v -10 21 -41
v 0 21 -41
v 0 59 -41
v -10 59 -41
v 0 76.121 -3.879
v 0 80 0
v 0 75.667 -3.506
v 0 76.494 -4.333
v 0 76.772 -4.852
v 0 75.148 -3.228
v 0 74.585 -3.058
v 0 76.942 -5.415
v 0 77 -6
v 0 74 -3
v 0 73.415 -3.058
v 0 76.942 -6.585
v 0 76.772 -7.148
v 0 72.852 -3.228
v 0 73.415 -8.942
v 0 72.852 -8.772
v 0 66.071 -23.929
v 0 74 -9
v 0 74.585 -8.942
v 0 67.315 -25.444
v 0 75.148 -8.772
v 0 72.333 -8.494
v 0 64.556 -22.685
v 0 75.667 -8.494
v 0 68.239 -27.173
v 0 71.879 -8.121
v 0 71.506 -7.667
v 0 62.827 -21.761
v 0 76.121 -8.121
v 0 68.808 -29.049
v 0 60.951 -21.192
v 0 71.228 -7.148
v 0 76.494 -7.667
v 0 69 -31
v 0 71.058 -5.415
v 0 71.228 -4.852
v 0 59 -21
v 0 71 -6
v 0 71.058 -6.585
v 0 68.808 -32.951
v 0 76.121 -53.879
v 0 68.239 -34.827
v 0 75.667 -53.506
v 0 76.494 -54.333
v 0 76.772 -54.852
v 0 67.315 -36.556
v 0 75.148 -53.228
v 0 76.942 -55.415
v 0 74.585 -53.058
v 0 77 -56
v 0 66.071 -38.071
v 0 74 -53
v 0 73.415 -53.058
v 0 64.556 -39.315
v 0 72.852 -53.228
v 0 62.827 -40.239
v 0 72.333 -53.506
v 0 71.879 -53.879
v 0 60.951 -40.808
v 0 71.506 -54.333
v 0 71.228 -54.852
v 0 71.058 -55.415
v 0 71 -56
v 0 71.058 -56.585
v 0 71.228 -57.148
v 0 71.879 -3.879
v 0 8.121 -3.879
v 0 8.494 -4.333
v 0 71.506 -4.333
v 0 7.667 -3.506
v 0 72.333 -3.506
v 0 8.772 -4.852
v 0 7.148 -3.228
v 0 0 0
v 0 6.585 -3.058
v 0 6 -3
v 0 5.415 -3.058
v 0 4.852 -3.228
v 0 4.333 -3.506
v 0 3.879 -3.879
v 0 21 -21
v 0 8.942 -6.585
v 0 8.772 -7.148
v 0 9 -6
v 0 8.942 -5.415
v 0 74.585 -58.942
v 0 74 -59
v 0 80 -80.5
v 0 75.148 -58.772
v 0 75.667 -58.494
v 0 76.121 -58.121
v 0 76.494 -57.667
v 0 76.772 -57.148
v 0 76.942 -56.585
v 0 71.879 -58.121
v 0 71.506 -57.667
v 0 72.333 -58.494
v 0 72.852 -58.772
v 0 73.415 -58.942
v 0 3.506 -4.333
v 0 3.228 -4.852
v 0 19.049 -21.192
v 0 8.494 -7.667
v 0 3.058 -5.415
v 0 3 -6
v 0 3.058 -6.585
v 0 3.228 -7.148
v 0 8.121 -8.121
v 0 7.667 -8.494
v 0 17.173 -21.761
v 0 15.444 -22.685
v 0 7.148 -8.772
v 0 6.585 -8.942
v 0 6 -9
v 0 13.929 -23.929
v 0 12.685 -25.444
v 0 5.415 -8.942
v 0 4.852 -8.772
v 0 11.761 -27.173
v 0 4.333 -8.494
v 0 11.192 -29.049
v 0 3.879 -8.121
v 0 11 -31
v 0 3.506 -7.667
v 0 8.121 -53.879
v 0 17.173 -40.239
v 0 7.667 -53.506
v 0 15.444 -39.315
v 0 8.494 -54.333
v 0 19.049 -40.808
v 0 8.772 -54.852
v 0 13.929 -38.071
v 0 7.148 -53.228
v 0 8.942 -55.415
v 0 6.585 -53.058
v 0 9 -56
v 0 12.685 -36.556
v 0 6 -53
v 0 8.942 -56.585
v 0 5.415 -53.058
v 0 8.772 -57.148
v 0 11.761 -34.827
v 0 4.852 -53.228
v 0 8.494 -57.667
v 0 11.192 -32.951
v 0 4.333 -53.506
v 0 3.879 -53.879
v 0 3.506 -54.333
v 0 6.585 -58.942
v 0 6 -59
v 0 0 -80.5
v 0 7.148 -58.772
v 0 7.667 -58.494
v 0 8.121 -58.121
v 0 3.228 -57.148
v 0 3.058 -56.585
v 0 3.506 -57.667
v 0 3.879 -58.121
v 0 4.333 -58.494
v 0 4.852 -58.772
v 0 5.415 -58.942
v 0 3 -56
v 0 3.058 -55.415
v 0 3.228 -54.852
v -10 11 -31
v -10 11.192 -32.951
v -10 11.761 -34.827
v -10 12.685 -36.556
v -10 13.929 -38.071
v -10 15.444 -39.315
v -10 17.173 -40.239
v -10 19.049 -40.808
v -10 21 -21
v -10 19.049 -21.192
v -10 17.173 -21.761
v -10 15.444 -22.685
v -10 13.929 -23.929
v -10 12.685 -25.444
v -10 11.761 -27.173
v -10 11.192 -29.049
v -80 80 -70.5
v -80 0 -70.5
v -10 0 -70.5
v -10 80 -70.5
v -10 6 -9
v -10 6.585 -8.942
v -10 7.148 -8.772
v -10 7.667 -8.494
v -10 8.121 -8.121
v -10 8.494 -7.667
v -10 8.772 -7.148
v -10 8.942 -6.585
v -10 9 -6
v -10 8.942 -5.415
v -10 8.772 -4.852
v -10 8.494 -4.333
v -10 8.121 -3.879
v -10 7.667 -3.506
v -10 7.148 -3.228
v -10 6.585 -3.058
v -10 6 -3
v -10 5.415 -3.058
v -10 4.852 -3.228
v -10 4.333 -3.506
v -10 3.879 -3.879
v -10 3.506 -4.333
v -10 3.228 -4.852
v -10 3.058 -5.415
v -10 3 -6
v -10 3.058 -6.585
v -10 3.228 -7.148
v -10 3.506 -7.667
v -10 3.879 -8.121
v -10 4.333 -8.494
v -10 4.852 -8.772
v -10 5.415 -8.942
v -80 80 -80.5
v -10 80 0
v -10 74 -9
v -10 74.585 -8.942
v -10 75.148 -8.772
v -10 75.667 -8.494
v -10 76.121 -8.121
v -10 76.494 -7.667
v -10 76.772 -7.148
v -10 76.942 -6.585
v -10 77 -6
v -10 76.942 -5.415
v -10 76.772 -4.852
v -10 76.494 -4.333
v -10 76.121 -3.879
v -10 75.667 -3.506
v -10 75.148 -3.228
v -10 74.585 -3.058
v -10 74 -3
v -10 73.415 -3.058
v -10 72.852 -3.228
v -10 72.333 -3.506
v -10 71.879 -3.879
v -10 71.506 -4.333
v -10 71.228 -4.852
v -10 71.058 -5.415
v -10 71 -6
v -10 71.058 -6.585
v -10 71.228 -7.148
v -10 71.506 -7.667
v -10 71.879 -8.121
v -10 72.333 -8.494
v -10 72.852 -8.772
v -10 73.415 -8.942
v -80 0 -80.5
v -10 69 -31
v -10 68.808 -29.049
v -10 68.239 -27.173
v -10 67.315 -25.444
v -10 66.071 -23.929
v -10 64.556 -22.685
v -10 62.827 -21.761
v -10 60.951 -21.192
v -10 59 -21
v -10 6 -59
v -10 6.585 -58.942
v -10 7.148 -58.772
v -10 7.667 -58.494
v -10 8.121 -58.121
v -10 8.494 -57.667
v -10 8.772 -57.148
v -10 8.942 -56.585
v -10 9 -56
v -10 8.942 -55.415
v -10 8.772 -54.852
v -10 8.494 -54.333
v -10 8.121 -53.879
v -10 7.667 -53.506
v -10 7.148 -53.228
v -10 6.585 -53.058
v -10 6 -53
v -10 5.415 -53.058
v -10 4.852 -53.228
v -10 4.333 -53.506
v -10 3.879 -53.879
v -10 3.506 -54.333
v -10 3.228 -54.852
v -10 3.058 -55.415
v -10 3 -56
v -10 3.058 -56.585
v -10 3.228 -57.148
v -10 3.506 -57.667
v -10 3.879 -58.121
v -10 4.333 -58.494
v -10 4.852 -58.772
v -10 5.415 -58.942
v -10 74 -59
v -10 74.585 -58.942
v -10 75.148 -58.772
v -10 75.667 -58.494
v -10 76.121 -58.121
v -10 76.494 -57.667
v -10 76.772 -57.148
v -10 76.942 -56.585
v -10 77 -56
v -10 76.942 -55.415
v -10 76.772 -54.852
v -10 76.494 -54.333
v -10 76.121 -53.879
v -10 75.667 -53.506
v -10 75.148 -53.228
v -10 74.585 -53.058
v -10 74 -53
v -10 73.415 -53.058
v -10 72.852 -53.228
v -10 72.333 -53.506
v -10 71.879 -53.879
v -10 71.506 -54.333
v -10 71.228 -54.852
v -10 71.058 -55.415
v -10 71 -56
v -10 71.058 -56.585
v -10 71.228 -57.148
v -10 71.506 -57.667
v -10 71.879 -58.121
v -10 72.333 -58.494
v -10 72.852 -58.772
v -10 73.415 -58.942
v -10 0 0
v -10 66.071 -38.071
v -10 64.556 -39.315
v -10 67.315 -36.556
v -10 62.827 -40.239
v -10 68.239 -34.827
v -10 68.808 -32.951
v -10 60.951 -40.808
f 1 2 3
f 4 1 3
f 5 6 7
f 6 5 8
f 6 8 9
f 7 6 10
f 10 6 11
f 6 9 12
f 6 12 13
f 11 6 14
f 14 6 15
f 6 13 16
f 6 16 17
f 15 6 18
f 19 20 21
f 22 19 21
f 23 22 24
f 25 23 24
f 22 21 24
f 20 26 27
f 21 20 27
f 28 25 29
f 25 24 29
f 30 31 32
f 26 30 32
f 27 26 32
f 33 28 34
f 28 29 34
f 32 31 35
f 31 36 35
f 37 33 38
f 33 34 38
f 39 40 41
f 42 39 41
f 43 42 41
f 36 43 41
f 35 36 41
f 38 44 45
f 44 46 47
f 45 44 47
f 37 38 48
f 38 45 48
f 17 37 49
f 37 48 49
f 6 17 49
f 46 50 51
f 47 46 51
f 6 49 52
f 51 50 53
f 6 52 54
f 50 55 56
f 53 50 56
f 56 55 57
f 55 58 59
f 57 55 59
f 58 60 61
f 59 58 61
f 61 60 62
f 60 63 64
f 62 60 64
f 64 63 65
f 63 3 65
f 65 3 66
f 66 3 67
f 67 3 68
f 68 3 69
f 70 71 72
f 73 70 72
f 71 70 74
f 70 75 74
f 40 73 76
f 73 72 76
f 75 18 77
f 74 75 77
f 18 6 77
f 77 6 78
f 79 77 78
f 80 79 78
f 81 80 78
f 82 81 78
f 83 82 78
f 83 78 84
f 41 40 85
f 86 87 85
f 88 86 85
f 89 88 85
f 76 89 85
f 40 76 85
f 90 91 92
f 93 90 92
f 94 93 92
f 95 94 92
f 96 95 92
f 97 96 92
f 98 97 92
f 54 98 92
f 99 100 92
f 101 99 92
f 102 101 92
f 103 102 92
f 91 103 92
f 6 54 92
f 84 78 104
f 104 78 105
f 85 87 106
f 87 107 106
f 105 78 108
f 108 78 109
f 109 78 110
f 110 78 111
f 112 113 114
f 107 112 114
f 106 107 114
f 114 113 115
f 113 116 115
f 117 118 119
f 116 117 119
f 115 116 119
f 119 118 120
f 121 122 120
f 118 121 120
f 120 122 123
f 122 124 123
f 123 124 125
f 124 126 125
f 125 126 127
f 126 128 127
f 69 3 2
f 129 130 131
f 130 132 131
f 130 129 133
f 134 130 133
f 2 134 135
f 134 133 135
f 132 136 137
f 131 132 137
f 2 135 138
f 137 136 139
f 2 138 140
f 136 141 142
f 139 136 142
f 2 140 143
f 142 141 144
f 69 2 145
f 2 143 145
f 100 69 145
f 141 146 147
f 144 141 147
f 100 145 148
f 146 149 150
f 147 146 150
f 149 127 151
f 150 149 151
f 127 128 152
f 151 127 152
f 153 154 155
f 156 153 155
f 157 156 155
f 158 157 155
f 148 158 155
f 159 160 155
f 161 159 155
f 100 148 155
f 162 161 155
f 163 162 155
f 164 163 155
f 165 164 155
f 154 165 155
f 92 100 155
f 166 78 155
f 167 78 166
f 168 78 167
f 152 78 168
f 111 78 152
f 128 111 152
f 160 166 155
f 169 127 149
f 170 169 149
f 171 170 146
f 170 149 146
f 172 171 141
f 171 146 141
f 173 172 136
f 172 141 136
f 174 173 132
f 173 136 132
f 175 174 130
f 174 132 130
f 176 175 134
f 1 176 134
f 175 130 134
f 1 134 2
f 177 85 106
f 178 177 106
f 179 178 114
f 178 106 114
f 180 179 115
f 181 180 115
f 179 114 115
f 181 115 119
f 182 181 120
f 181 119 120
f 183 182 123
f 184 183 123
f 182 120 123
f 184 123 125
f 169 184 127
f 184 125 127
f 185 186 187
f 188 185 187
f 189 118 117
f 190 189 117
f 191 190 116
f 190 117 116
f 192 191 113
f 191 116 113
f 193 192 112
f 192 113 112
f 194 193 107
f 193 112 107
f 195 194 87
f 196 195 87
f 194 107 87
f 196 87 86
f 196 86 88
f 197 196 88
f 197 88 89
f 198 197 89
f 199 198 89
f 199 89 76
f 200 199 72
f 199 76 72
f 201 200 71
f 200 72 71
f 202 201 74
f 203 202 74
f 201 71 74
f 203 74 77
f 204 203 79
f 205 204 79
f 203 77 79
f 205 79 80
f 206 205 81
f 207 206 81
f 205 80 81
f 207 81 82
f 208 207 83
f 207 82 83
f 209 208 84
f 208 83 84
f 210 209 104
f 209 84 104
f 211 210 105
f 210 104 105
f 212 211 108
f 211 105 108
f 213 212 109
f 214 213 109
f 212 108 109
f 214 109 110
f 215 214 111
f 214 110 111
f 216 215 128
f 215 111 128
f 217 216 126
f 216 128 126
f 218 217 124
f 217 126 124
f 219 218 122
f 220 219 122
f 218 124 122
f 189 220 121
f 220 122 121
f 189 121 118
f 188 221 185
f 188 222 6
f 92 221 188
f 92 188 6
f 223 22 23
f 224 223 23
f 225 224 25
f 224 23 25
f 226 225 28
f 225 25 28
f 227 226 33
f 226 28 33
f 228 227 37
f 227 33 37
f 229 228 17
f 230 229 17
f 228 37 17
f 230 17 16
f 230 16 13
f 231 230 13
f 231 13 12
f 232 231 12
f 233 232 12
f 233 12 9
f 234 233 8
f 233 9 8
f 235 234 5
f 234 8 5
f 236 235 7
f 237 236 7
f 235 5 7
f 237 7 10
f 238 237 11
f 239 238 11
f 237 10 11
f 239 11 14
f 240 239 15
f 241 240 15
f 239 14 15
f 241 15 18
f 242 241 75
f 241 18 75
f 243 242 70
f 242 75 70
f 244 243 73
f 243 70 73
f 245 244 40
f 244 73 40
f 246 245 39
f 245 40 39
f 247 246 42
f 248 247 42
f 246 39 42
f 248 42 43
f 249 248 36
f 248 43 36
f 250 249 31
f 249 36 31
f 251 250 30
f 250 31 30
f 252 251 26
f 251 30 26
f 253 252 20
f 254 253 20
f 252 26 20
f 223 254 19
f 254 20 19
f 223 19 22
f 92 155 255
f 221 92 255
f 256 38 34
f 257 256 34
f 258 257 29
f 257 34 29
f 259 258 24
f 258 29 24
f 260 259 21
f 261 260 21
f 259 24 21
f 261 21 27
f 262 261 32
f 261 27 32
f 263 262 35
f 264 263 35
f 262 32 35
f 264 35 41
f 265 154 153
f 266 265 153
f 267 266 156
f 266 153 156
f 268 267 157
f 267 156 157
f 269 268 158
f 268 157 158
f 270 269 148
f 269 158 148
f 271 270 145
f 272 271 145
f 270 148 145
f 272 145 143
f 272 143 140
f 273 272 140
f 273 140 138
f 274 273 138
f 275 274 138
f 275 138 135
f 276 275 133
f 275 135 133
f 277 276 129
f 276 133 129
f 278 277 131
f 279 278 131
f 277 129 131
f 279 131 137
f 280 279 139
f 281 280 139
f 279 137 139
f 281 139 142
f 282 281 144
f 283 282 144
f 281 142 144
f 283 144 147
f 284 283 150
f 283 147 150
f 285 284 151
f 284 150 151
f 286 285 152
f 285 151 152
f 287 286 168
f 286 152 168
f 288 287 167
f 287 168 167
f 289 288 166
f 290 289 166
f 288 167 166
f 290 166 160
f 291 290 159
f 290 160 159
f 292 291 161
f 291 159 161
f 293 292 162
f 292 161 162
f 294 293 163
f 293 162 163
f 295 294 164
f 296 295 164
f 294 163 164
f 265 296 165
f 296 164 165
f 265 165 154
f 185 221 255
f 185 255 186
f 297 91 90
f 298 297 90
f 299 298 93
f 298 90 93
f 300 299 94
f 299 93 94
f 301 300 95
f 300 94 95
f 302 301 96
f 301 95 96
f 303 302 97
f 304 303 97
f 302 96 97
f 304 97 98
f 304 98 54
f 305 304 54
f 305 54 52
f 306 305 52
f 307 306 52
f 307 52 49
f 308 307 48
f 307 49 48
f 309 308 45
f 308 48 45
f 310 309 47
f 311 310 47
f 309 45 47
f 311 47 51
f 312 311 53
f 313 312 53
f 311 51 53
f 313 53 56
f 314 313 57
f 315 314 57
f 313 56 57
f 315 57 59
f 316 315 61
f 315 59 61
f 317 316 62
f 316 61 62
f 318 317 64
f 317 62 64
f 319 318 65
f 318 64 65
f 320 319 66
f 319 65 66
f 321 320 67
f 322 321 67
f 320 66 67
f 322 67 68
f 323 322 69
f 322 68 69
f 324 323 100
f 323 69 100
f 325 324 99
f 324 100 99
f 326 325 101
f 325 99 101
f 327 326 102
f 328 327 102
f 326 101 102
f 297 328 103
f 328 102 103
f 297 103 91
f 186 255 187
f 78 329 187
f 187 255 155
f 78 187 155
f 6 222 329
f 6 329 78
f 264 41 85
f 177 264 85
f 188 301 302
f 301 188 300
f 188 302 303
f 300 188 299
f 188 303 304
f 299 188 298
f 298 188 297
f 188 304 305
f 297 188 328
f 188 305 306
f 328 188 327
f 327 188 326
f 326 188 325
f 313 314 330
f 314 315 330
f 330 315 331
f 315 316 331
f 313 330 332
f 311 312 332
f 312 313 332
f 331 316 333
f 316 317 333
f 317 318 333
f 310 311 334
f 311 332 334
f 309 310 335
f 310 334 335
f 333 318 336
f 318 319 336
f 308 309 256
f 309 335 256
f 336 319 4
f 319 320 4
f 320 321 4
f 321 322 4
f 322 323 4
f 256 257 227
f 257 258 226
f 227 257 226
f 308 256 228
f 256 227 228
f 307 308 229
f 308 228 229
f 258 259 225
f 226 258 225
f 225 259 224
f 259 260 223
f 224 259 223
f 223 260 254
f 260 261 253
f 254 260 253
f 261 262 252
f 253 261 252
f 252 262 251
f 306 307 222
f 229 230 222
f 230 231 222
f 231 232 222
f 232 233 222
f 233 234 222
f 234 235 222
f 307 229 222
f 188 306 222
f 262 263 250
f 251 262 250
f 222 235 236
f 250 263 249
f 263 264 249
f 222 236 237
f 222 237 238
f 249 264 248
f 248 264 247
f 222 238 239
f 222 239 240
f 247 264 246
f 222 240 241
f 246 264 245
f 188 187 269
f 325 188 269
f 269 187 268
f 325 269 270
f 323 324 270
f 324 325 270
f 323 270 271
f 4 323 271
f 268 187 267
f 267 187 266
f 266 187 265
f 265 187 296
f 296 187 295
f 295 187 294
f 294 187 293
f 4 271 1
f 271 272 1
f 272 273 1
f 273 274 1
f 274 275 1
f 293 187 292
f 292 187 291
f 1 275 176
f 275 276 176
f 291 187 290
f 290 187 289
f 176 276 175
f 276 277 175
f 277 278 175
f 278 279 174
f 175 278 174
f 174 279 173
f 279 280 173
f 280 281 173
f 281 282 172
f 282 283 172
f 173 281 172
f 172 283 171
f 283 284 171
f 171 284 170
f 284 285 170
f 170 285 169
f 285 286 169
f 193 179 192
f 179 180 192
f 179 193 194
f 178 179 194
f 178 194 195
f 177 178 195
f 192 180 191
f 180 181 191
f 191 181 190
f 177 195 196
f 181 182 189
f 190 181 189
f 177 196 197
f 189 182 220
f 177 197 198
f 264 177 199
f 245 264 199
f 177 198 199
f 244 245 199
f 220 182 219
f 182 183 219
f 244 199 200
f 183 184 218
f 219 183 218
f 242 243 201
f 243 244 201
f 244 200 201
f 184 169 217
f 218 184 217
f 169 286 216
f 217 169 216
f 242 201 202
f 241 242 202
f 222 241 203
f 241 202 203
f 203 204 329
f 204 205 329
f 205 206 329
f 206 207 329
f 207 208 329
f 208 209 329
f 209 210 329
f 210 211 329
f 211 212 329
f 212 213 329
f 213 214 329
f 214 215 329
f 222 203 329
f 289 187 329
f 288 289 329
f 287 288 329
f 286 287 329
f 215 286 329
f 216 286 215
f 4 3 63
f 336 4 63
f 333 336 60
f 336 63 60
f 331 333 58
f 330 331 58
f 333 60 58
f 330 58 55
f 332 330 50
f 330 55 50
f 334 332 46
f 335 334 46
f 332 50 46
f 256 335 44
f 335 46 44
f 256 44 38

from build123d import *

# Parameters (mm, degrees)
BOSS_EXTRUDE1_DEPTH = 80
SKETCH2_R           = 3
CUT_EXTRUDE1_DEPTH  = 10
CUT_EXTRUDE2_DEPTH  = 10


with BuildPart() as part:
    # Sketch1 → Boss-Extrude1 (new body)
    with BuildSketch(Plane(origin=(0, 0, 0), x_dir=(1, 0, 0), z_dir=(0, 1, 0))):
        Polygon((0, 0), (0, 80.5), (-80, 80.5), (-80, 70.5), (-10, 70.5), (-10, 0), align=None)
    extrude(amount=BOSS_EXTRUDE1_DEPTH)

    # Sketch2 → Cut-Extrude1 (cut)
    with BuildSketch(Plane(origin=(0, 0, 0), x_dir=(0, 0, -1), z_dir=(1, 0, 0))):
        with Locations((6, 6)):
            Circle(SKETCH2_R)
        with Locations((6, 74)):
            Circle(SKETCH2_R)
        with Locations((56, 74)):
            Circle(SKETCH2_R)
        with Locations((56, 6)):
            Circle(SKETCH2_R)
    extrude(amount=-CUT_EXTRUDE1_DEPTH, mode=Mode.SUBTRACT)

    # Sketch3 → Cut-Extrude2 (cut)
    with BuildSketch(Plane(origin=(0, 0, 0), x_dir=(0, 0, -1), z_dir=(1, 0, 0))):
        with BuildLine():
            Line((21, 59), (21, 21))
            ThreePointArc((21, 21), (23.928932188, 13.928932188), (31, 11))
            ThreePointArc((31, 11), (38.071067812, 13.928932188), (41, 21))
            Line((41, 21), (41, 59))
            ThreePointArc((41, 59), (38.071067812, 66.071067812), (31, 69))
            ThreePointArc((31, 69), (23.928932188, 66.071067812), (21, 59))
        make_face()
    extrude(amount=-CUT_EXTRUDE2_DEPTH, mode=Mode.SUBTRACT)


solid = part.part
